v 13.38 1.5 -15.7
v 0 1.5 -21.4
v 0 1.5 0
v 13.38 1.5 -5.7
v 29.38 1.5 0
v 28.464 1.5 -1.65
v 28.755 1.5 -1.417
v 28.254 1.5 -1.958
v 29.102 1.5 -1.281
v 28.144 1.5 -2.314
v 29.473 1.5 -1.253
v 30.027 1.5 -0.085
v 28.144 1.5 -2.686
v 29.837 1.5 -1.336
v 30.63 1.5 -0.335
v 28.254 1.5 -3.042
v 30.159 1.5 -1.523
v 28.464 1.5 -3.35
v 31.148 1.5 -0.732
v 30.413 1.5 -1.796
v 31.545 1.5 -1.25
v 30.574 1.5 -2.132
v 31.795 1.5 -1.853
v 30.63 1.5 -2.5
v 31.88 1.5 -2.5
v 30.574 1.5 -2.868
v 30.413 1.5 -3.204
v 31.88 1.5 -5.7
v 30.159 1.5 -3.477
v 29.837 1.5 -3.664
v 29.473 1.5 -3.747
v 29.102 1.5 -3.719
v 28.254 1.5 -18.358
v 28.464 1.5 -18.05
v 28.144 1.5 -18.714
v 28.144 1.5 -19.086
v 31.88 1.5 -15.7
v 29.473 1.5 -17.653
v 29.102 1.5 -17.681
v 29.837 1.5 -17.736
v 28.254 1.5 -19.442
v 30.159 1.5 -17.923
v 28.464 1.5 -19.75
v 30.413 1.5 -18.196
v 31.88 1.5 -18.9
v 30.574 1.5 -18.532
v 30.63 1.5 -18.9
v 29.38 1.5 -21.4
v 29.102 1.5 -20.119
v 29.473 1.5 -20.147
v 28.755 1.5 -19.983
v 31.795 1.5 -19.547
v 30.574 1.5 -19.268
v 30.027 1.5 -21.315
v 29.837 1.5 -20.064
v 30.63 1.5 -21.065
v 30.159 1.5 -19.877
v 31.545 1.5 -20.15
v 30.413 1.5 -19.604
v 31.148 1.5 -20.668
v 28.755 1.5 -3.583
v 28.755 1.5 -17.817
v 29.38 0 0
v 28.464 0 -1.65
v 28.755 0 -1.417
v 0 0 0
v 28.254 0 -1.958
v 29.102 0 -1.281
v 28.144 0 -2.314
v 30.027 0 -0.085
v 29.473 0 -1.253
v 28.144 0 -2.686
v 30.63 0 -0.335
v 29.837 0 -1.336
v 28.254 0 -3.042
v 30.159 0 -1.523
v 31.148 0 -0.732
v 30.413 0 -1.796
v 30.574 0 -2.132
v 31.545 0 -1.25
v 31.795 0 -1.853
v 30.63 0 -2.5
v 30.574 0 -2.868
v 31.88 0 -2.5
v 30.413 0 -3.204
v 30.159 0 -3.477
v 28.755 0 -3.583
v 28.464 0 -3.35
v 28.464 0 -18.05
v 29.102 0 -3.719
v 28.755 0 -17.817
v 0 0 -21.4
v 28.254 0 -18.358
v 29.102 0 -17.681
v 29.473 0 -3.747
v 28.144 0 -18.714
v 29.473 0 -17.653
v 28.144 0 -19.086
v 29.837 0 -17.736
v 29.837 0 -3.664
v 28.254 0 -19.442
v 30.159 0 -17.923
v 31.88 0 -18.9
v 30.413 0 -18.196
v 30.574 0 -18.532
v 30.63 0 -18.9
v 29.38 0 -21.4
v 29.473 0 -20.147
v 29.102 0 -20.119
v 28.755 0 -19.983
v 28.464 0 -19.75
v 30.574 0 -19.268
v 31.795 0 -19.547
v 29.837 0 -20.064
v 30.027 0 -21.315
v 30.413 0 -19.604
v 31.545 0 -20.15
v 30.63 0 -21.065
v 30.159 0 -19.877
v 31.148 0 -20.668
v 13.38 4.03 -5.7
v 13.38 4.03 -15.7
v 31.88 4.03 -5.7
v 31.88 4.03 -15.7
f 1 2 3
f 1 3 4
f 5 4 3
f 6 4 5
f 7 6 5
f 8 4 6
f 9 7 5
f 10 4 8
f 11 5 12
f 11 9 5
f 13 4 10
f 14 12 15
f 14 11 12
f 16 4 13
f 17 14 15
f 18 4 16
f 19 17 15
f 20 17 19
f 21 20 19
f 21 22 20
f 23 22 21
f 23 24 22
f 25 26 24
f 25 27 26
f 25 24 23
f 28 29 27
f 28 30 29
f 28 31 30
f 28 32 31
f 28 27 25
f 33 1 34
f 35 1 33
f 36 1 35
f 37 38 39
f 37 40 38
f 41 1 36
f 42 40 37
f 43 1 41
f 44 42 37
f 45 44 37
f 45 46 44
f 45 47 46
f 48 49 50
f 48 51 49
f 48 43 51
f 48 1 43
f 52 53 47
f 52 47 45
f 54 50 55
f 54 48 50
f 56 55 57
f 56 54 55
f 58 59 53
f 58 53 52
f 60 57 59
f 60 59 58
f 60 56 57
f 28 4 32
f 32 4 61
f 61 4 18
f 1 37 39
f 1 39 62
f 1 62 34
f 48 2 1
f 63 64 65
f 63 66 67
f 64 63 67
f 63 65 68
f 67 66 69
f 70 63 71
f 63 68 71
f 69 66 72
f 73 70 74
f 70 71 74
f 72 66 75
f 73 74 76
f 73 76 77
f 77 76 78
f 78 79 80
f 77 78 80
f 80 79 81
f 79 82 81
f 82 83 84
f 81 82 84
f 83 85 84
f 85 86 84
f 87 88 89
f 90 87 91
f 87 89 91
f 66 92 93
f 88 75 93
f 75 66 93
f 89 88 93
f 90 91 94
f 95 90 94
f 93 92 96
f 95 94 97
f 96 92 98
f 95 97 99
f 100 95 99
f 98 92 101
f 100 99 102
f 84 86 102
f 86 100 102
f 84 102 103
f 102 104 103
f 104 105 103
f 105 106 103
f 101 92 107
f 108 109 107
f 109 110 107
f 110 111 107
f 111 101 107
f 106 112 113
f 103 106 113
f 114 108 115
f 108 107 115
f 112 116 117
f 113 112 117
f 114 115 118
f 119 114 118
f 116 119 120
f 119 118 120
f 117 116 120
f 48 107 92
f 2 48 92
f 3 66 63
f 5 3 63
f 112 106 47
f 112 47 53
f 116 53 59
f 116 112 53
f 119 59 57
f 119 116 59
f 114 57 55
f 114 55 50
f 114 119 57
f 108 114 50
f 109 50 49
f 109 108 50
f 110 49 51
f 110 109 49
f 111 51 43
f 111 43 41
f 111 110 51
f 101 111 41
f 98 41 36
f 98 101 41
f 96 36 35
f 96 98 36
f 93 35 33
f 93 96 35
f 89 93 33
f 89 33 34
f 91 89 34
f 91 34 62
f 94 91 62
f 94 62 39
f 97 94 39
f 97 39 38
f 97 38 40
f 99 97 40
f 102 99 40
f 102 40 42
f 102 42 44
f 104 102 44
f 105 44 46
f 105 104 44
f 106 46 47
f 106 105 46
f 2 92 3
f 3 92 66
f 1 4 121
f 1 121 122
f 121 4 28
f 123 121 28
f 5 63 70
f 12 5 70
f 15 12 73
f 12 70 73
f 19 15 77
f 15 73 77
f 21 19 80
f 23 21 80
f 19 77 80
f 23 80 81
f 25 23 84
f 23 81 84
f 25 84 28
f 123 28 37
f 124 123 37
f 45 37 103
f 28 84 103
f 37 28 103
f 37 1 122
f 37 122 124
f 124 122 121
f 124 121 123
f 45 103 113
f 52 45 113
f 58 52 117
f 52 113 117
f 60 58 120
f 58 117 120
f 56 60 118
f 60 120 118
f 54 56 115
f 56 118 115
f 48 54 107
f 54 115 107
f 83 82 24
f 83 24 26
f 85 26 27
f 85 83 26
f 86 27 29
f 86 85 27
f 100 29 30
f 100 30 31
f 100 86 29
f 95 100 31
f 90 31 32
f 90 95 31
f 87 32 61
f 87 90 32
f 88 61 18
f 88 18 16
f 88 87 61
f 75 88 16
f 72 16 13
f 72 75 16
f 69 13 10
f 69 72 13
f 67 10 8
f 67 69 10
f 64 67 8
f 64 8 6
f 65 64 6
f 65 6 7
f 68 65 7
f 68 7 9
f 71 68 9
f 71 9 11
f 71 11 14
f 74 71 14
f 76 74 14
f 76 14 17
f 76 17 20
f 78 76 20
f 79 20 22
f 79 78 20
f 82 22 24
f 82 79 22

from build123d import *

# Parameters (mm, degrees)
SKETCH1_R           = 1.25
BOSS_EXTRUDE1_DEPTH = 1.5
SKETCH3_W           = 18.5
SKETCH3_H           = 10
BOSS_EXTRUDE2_DEPTH = 2.53


with BuildPart() as part:
    # Sketch1 → Boss-Extrude1 (new body)
    with BuildSketch(Plane(origin=(0, 0, 0), x_dir=(1, 0, 0), z_dir=(0, 1, 0))):
        with BuildLine():
            Line((31.88, 2.5), (31.88, 18.9))
            ThreePointArc((31.88, 18.9), (31.147766953, 20.667766953), (29.38, 21.4))
            Line((29.38, 21.4), (0, 21.4))
            Line((0, 21.4), (0, 0))
            Line((0, 0), (29.38, 0))
            ThreePointArc((29.38, 0), (31.147766953, 0.732233047), (31.88, 2.5))
        make_face()
        with Locations((29.38, 2.5)):
            Circle(SKETCH1_R, mode=Mode.SUBTRACT)
        with Locations((29.38, 18.9)):
            Circle(SKETCH1_R, mode=Mode.SUBTRACT)
    extrude(amount=BOSS_EXTRUDE1_DEPTH)

    # Sketch3 → Boss-Extrude2 (add)
    with BuildSketch(Plane(origin=(0, 1.5, 0), x_dir=(1, 0, 0), z_dir=(0, 1, 0))):
        with Locations((22.63, 10.7)):
            Rectangle(SKETCH3_W, SKETCH3_H)
    extrude(amount=BOSS_EXTRUDE2_DEPTH)


solid = part.part
